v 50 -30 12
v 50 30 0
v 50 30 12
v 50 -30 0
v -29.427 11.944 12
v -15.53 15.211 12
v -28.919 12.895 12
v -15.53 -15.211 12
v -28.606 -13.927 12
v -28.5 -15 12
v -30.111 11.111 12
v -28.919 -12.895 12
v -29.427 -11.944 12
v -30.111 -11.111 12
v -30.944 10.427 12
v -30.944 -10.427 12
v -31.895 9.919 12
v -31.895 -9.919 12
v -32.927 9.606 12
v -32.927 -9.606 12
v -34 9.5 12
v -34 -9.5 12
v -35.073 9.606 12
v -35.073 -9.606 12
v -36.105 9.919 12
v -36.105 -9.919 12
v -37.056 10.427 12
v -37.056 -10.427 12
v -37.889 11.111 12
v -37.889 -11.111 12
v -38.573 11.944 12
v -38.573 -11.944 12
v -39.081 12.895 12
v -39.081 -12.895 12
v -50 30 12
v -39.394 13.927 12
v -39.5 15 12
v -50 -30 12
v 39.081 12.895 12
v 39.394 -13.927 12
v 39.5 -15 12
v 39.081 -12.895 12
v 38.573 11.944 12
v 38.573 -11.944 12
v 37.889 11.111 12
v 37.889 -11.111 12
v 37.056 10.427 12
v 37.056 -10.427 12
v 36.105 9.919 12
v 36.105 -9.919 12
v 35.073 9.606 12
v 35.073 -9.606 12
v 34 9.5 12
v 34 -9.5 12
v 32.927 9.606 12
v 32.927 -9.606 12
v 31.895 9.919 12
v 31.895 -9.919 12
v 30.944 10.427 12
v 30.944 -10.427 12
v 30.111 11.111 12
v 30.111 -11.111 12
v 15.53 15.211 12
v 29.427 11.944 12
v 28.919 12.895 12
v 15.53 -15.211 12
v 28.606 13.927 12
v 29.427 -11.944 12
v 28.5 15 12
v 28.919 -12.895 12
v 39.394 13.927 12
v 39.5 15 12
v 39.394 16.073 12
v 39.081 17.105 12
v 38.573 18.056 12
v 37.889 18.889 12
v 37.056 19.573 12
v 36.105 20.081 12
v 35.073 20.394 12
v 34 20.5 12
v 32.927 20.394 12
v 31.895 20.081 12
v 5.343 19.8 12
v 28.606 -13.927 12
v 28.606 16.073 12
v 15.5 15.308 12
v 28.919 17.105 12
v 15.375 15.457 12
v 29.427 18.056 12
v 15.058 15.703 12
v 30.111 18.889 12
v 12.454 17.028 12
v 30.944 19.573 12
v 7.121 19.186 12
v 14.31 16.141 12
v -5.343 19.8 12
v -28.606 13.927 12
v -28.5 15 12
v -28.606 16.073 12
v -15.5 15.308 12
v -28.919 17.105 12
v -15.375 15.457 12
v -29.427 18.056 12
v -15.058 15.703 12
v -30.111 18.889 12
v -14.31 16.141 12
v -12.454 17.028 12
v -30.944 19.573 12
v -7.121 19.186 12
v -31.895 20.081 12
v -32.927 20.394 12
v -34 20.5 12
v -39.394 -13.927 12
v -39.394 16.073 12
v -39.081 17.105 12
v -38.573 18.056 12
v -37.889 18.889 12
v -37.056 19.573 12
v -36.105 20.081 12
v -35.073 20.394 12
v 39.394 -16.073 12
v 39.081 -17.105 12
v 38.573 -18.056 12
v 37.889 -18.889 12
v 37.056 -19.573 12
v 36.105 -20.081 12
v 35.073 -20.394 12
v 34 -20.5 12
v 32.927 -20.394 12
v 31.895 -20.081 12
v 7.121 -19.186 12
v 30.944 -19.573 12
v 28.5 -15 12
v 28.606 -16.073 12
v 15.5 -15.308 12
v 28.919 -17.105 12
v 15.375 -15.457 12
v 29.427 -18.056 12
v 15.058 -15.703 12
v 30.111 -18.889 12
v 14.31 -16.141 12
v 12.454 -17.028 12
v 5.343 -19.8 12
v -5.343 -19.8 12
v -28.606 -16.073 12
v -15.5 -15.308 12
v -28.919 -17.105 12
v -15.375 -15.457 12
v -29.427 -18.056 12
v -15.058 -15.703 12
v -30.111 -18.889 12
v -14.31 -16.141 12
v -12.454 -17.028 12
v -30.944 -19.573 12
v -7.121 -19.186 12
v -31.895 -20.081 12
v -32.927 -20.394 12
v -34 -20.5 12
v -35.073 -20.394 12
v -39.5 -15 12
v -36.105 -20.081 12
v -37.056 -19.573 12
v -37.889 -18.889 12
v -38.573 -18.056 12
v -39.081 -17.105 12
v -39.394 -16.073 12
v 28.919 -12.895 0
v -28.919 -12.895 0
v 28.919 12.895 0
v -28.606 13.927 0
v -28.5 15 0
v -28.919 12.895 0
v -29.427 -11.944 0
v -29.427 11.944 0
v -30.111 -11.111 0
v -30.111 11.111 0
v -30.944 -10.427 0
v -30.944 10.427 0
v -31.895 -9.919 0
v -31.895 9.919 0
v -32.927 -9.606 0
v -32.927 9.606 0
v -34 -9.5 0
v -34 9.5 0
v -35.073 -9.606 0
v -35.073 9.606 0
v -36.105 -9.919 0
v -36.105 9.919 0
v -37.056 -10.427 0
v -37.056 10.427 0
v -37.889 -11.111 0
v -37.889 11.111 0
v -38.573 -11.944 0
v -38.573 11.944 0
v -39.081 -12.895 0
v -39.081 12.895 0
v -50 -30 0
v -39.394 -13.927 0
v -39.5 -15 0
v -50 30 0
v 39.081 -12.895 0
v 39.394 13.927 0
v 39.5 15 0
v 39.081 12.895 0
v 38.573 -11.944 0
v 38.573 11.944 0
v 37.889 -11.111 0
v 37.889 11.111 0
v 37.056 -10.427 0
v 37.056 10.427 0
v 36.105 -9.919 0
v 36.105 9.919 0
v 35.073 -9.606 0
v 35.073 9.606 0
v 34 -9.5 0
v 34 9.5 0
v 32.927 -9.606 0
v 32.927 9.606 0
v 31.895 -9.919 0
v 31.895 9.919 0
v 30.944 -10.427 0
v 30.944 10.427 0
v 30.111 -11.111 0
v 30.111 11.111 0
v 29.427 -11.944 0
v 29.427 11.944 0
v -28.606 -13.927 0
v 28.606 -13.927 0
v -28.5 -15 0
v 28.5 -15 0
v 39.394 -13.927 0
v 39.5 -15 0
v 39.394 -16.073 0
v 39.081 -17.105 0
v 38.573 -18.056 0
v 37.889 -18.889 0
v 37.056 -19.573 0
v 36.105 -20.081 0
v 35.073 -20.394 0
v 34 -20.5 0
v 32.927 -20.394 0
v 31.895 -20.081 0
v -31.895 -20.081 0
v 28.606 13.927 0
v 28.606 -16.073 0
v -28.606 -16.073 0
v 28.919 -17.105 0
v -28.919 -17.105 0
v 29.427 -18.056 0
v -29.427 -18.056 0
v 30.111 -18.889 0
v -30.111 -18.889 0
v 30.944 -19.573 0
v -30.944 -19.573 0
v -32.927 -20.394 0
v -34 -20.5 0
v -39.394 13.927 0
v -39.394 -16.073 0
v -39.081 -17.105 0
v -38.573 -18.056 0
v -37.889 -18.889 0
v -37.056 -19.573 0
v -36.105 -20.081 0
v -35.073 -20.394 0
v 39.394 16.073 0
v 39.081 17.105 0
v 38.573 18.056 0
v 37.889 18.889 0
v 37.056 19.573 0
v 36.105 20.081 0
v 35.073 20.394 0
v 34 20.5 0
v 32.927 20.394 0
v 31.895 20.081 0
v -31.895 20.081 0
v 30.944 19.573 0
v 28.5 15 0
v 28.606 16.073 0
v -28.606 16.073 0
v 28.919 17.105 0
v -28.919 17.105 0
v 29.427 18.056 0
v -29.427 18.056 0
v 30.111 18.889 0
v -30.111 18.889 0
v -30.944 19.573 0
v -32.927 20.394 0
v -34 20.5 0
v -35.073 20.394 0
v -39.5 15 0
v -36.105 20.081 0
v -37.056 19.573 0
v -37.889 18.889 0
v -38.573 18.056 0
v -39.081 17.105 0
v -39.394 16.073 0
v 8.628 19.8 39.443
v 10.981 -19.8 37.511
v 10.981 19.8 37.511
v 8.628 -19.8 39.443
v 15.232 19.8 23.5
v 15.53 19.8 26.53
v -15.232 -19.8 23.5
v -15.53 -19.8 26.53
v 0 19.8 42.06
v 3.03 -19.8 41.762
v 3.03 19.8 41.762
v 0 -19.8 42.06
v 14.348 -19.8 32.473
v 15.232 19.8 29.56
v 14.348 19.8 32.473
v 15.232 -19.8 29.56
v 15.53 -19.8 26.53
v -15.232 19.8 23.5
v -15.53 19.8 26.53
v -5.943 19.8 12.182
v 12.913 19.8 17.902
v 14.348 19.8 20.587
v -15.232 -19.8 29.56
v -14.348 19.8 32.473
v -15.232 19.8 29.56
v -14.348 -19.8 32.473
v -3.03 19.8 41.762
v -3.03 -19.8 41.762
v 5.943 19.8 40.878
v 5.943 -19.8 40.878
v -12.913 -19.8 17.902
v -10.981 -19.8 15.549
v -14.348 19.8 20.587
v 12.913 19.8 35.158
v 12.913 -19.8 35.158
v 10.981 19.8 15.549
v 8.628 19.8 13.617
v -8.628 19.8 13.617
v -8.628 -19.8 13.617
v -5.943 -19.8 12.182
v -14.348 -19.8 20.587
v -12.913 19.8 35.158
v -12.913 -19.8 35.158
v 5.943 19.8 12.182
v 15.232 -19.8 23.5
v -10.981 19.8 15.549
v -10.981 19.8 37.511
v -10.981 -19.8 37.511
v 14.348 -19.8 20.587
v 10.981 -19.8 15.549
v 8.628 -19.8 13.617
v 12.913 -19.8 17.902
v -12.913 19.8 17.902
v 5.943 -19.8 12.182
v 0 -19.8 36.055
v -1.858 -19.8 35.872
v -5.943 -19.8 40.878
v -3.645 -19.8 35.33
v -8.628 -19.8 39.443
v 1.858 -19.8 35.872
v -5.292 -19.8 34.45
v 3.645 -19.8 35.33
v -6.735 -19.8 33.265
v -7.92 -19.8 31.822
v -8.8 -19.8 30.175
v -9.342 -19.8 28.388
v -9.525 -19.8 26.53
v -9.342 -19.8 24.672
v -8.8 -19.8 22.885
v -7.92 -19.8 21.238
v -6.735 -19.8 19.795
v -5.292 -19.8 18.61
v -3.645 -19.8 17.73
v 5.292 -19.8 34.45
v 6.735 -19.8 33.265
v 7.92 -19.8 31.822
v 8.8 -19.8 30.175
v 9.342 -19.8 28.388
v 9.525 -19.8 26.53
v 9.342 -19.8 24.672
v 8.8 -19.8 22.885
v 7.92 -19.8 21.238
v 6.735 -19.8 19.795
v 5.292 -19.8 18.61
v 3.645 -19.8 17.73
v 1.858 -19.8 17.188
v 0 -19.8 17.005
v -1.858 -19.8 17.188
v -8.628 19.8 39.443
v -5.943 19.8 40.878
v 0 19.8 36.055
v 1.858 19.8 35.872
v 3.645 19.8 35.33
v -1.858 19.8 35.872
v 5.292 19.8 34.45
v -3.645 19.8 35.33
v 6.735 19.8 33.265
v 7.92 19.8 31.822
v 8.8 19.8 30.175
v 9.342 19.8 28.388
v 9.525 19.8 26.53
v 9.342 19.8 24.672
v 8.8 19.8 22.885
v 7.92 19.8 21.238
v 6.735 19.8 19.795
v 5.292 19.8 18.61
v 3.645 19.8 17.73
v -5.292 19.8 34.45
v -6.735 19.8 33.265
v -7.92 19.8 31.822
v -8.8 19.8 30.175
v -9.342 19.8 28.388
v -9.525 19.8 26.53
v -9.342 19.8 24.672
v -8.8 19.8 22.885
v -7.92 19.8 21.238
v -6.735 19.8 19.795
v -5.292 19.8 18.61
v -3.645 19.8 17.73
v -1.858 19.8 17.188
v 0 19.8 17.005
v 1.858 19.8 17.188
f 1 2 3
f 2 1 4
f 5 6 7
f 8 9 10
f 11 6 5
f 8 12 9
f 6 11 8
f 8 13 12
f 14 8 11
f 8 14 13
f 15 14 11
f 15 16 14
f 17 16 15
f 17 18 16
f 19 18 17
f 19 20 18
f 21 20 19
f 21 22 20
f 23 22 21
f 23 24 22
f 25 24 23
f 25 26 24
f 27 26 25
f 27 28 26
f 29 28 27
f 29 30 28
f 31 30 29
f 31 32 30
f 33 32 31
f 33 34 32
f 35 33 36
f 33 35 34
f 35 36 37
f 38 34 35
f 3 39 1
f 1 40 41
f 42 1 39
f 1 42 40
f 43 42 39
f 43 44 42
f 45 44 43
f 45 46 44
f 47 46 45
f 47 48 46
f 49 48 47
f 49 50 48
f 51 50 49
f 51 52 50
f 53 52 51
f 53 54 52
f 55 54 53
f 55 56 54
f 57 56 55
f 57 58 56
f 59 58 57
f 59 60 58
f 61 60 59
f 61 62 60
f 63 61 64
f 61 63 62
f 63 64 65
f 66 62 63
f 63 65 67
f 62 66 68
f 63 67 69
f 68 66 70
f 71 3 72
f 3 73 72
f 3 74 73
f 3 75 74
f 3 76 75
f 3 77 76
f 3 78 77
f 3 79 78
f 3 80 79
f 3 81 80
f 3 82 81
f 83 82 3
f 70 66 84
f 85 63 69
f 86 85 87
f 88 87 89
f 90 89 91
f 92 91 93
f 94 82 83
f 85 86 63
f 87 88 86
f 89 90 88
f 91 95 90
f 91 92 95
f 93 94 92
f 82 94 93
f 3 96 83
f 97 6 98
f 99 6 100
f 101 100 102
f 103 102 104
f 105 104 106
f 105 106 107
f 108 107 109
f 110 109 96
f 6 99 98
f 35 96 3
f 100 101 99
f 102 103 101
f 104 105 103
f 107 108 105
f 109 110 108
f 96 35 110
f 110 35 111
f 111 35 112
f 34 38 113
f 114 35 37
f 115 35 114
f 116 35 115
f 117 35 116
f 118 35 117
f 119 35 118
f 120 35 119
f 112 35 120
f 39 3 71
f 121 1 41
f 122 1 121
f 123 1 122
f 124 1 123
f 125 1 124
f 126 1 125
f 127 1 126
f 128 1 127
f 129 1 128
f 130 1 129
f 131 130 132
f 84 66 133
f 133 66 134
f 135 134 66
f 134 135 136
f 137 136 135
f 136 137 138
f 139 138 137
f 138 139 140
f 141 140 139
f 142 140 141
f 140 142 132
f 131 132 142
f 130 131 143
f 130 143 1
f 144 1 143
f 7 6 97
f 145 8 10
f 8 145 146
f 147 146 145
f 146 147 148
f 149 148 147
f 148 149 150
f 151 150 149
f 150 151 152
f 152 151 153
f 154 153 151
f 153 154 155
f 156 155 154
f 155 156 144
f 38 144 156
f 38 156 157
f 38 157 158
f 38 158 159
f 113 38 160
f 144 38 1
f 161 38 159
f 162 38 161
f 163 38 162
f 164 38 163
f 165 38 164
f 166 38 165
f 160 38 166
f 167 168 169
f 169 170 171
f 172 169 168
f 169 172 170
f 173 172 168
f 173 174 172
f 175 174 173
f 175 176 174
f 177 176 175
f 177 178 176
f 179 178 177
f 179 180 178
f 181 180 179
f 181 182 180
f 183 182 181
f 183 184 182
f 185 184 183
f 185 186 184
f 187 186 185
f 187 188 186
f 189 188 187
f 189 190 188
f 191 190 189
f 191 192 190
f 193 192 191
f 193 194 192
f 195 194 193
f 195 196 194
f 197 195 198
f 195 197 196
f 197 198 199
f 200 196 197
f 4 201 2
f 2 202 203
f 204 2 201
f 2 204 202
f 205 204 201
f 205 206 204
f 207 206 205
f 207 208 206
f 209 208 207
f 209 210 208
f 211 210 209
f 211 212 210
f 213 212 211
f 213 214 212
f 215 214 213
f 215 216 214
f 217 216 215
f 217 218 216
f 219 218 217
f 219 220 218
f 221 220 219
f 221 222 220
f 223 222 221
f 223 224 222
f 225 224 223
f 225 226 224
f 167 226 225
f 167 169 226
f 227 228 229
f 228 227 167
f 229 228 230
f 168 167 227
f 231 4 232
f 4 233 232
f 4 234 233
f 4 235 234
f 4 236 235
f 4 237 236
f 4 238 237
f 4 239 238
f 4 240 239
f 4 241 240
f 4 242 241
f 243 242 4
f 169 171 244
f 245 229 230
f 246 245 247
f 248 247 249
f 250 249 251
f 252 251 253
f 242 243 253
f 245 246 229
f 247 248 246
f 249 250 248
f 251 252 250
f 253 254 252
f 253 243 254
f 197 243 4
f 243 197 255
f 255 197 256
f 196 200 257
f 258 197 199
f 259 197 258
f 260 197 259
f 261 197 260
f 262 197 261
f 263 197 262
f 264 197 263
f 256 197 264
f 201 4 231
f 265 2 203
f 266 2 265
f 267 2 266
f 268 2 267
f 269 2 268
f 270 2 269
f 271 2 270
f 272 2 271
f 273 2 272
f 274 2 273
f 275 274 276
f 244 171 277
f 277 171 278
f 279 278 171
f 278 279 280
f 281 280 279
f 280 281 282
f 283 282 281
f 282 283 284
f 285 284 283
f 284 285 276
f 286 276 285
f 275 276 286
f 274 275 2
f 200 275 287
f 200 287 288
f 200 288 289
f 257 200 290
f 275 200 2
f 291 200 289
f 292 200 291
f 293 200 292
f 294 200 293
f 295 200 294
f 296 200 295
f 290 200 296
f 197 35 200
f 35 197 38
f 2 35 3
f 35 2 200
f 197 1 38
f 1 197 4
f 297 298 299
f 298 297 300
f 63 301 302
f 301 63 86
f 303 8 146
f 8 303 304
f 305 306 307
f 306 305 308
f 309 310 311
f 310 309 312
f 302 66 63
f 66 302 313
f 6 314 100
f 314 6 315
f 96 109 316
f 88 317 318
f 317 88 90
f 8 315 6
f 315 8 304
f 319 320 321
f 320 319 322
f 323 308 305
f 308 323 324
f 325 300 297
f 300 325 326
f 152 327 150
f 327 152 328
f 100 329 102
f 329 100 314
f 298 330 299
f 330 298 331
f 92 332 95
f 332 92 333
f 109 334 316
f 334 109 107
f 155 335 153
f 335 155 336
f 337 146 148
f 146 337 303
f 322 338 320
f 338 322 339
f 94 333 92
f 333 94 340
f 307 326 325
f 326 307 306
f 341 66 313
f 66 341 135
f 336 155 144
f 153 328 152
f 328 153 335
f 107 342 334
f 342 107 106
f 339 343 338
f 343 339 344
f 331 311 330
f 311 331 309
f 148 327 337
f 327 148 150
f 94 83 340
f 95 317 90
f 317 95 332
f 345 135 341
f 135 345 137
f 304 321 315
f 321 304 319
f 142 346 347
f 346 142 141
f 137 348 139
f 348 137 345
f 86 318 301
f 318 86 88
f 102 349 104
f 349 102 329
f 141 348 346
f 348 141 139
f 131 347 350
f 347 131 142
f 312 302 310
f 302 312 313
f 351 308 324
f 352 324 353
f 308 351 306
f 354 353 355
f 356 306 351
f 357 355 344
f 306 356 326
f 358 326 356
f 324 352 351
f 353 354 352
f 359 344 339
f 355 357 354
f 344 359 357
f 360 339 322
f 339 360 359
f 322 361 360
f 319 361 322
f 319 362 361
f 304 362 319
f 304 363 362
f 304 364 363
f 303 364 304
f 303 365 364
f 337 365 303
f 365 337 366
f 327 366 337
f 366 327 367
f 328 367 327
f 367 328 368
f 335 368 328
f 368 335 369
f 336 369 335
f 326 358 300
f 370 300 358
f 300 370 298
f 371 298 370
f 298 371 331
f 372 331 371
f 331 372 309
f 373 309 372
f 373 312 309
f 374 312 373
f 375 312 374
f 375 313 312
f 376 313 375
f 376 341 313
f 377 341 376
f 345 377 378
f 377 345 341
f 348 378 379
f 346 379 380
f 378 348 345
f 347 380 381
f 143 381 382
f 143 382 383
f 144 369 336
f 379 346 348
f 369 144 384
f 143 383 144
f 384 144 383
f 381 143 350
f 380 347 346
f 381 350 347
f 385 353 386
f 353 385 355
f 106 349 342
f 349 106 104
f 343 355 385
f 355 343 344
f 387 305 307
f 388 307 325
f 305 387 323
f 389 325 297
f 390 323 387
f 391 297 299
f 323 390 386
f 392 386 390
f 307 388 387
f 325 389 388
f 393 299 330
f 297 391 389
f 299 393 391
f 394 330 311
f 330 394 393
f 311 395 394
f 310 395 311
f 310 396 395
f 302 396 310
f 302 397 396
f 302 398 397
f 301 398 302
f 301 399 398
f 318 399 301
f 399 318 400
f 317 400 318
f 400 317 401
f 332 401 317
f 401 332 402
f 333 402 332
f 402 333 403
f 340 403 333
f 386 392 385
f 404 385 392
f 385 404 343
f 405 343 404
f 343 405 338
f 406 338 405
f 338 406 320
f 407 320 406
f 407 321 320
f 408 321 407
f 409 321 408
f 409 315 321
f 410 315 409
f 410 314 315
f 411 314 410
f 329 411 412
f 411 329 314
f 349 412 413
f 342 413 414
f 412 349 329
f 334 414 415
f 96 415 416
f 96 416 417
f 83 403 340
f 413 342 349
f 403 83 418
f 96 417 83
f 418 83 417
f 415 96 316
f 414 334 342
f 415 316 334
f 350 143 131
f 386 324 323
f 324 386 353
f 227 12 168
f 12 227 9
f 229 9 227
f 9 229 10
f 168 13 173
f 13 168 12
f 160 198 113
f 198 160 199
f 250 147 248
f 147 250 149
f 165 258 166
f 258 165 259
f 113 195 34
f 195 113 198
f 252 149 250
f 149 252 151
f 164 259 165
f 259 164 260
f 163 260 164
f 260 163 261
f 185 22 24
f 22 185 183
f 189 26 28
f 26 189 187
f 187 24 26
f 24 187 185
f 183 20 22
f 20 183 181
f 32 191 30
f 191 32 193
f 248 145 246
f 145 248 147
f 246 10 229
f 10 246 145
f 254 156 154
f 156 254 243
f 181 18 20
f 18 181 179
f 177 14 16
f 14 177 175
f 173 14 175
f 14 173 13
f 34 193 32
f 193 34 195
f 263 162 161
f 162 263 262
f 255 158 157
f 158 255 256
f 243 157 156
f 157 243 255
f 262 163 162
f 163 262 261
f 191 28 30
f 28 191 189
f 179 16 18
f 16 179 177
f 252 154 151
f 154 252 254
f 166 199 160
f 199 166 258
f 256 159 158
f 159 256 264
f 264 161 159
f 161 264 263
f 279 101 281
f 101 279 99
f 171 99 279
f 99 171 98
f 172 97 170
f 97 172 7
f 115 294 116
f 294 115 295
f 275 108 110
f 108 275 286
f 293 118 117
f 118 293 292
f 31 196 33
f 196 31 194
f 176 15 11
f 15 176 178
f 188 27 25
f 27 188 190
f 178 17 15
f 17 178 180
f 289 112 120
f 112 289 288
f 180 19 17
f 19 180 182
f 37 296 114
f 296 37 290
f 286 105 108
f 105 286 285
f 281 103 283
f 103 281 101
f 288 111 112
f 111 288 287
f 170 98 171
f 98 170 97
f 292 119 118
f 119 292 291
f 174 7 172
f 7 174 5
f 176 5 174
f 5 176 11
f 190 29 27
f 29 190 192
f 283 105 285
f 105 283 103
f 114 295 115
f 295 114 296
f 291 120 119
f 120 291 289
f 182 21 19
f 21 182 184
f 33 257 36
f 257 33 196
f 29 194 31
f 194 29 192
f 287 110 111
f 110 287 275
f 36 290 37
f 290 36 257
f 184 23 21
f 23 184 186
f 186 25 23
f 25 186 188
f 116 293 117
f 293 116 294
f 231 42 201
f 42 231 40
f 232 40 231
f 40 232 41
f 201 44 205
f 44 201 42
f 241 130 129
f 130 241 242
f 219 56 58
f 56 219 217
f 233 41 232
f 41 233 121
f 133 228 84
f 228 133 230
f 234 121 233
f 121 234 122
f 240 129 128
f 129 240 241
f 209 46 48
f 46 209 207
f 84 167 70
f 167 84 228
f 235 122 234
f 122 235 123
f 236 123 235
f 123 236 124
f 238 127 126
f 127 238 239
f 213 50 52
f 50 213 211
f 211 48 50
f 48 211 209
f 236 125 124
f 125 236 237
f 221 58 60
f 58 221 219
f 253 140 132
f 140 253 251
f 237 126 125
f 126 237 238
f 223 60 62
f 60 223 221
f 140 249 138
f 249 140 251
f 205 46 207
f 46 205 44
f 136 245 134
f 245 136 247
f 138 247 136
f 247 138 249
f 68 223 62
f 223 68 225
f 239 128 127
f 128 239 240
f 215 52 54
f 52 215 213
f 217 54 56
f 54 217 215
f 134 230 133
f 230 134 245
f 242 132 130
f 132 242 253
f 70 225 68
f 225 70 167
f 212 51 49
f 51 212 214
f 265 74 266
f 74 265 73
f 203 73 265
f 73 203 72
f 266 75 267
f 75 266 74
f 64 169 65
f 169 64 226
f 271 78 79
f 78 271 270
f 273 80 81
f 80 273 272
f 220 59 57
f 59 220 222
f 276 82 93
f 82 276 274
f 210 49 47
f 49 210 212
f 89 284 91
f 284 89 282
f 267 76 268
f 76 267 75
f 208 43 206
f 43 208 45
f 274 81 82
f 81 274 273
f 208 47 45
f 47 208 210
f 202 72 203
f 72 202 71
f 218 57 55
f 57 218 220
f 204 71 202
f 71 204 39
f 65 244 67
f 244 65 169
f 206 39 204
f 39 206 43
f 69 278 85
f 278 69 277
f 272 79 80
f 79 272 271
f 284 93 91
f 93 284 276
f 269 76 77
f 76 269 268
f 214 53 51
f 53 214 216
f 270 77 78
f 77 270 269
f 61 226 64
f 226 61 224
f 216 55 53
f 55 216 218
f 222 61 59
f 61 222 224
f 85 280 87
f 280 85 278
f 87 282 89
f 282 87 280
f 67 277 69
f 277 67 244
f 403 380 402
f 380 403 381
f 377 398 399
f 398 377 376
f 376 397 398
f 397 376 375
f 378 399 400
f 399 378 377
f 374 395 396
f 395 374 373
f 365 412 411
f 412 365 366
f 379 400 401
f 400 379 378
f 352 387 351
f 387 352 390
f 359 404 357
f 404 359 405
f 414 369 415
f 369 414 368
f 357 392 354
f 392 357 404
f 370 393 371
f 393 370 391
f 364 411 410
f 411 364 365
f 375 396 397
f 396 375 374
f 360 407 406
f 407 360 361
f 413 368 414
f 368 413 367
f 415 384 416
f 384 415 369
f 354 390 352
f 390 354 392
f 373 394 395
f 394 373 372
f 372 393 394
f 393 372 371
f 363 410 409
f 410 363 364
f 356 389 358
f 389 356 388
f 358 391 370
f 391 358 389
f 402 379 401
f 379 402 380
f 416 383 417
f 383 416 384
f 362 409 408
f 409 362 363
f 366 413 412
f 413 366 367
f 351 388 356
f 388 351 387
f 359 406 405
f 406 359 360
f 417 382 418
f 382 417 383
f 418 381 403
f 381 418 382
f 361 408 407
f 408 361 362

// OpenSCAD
$fn = 32;

// ----------------------------------------------------------------------
// Bearing block: 100 x 60 mm base, 19.05 mm bore at 26.53 mm
// ----------------------------------------------------------------------

// --- parameters (mm) ---
base_w = 100;             // base width
base_d = 60;              // base depth
base_t = 12;              // base thickness
bore_d = 19.05;           // shaft / bearing bore
house_r = 15.53;          // housing outer radius
house_len = 39.6;         // housing length along the shaft
foot_w = 31.06;           // foot width under the housing
foot_len = 29.6;          // foot length along the shaft
axis_z = 26.53;           // bore axis height above the base
holes_d = 11;             // mounting holes
hole_x = 34;              // mounting hole spacing

difference() {
  union() {
    /* base plate with its underside on z = 0 */
    translate([0, 0, base_t / 2]) cube([base_w, base_d, base_t], center = true);
    /* hull foot: a straight web blending into the round housing */
    hull() {
      translate([0, 0, base_t - 0.5]) cube([foot_w, foot_len, 1.6], center = true);
      translate([0, 0, axis_z]) rotate([-90, 0, 0]) cylinder(h = house_len, d = 2 * house_r, center = true);
    }
  }
  /* bore through the housing, 2.5 mm clear on both sides */
  translate([0, 0, axis_z]) rotate([-90, 0, 0]) cylinder(h = house_len + 5, d = bore_d, center = true);
  /* mounting holes through the base plate */
  for (hx = [-34, 34]) {
    for (hy = [-15, 15]) {
      translate([hx, hy, -2.5]) cylinder(h = base_t + 5, d = holes_d);
    }
  }
}
